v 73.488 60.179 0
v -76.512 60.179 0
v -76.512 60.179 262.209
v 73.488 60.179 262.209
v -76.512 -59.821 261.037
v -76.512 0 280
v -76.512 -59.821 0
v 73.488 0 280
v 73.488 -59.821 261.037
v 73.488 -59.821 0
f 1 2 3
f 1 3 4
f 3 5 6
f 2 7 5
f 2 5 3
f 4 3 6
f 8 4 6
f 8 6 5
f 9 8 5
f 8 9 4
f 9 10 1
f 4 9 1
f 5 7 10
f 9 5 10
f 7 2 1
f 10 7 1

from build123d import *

# Parameters (mm, degrees)
F0_W     = 150
F0_H     = 120
F1_DEPTH = 280
F3_DEPTH = 150


with BuildPart() as f1:
    # F0 (on Top) → F1 (new body)
    with BuildSketch(Plane.XY):
        with Locations((-1.511779, 0.179398)):
            Rectangle(F0_W, F0_H)
    extrude(amount=F1_DEPTH)

    # F2 (on face) → F3 (cut, through all)
    with BuildSketch(Plane(origin=(-76.511779, 0, 0), x_dir=(0, -1, 0), z_dir=(-1, 0, 0))):
        Polygon((-60.179398, 262.2087), (0, 280), (-60.179398, 280), align=None)
        Polygon((59.820602, 280), (0, 280), (59.820602, 261.037251), align=None)
    extrude(amount=-F3_DEPTH, mode=Mode.SUBTRACT)


solid = f1.part
